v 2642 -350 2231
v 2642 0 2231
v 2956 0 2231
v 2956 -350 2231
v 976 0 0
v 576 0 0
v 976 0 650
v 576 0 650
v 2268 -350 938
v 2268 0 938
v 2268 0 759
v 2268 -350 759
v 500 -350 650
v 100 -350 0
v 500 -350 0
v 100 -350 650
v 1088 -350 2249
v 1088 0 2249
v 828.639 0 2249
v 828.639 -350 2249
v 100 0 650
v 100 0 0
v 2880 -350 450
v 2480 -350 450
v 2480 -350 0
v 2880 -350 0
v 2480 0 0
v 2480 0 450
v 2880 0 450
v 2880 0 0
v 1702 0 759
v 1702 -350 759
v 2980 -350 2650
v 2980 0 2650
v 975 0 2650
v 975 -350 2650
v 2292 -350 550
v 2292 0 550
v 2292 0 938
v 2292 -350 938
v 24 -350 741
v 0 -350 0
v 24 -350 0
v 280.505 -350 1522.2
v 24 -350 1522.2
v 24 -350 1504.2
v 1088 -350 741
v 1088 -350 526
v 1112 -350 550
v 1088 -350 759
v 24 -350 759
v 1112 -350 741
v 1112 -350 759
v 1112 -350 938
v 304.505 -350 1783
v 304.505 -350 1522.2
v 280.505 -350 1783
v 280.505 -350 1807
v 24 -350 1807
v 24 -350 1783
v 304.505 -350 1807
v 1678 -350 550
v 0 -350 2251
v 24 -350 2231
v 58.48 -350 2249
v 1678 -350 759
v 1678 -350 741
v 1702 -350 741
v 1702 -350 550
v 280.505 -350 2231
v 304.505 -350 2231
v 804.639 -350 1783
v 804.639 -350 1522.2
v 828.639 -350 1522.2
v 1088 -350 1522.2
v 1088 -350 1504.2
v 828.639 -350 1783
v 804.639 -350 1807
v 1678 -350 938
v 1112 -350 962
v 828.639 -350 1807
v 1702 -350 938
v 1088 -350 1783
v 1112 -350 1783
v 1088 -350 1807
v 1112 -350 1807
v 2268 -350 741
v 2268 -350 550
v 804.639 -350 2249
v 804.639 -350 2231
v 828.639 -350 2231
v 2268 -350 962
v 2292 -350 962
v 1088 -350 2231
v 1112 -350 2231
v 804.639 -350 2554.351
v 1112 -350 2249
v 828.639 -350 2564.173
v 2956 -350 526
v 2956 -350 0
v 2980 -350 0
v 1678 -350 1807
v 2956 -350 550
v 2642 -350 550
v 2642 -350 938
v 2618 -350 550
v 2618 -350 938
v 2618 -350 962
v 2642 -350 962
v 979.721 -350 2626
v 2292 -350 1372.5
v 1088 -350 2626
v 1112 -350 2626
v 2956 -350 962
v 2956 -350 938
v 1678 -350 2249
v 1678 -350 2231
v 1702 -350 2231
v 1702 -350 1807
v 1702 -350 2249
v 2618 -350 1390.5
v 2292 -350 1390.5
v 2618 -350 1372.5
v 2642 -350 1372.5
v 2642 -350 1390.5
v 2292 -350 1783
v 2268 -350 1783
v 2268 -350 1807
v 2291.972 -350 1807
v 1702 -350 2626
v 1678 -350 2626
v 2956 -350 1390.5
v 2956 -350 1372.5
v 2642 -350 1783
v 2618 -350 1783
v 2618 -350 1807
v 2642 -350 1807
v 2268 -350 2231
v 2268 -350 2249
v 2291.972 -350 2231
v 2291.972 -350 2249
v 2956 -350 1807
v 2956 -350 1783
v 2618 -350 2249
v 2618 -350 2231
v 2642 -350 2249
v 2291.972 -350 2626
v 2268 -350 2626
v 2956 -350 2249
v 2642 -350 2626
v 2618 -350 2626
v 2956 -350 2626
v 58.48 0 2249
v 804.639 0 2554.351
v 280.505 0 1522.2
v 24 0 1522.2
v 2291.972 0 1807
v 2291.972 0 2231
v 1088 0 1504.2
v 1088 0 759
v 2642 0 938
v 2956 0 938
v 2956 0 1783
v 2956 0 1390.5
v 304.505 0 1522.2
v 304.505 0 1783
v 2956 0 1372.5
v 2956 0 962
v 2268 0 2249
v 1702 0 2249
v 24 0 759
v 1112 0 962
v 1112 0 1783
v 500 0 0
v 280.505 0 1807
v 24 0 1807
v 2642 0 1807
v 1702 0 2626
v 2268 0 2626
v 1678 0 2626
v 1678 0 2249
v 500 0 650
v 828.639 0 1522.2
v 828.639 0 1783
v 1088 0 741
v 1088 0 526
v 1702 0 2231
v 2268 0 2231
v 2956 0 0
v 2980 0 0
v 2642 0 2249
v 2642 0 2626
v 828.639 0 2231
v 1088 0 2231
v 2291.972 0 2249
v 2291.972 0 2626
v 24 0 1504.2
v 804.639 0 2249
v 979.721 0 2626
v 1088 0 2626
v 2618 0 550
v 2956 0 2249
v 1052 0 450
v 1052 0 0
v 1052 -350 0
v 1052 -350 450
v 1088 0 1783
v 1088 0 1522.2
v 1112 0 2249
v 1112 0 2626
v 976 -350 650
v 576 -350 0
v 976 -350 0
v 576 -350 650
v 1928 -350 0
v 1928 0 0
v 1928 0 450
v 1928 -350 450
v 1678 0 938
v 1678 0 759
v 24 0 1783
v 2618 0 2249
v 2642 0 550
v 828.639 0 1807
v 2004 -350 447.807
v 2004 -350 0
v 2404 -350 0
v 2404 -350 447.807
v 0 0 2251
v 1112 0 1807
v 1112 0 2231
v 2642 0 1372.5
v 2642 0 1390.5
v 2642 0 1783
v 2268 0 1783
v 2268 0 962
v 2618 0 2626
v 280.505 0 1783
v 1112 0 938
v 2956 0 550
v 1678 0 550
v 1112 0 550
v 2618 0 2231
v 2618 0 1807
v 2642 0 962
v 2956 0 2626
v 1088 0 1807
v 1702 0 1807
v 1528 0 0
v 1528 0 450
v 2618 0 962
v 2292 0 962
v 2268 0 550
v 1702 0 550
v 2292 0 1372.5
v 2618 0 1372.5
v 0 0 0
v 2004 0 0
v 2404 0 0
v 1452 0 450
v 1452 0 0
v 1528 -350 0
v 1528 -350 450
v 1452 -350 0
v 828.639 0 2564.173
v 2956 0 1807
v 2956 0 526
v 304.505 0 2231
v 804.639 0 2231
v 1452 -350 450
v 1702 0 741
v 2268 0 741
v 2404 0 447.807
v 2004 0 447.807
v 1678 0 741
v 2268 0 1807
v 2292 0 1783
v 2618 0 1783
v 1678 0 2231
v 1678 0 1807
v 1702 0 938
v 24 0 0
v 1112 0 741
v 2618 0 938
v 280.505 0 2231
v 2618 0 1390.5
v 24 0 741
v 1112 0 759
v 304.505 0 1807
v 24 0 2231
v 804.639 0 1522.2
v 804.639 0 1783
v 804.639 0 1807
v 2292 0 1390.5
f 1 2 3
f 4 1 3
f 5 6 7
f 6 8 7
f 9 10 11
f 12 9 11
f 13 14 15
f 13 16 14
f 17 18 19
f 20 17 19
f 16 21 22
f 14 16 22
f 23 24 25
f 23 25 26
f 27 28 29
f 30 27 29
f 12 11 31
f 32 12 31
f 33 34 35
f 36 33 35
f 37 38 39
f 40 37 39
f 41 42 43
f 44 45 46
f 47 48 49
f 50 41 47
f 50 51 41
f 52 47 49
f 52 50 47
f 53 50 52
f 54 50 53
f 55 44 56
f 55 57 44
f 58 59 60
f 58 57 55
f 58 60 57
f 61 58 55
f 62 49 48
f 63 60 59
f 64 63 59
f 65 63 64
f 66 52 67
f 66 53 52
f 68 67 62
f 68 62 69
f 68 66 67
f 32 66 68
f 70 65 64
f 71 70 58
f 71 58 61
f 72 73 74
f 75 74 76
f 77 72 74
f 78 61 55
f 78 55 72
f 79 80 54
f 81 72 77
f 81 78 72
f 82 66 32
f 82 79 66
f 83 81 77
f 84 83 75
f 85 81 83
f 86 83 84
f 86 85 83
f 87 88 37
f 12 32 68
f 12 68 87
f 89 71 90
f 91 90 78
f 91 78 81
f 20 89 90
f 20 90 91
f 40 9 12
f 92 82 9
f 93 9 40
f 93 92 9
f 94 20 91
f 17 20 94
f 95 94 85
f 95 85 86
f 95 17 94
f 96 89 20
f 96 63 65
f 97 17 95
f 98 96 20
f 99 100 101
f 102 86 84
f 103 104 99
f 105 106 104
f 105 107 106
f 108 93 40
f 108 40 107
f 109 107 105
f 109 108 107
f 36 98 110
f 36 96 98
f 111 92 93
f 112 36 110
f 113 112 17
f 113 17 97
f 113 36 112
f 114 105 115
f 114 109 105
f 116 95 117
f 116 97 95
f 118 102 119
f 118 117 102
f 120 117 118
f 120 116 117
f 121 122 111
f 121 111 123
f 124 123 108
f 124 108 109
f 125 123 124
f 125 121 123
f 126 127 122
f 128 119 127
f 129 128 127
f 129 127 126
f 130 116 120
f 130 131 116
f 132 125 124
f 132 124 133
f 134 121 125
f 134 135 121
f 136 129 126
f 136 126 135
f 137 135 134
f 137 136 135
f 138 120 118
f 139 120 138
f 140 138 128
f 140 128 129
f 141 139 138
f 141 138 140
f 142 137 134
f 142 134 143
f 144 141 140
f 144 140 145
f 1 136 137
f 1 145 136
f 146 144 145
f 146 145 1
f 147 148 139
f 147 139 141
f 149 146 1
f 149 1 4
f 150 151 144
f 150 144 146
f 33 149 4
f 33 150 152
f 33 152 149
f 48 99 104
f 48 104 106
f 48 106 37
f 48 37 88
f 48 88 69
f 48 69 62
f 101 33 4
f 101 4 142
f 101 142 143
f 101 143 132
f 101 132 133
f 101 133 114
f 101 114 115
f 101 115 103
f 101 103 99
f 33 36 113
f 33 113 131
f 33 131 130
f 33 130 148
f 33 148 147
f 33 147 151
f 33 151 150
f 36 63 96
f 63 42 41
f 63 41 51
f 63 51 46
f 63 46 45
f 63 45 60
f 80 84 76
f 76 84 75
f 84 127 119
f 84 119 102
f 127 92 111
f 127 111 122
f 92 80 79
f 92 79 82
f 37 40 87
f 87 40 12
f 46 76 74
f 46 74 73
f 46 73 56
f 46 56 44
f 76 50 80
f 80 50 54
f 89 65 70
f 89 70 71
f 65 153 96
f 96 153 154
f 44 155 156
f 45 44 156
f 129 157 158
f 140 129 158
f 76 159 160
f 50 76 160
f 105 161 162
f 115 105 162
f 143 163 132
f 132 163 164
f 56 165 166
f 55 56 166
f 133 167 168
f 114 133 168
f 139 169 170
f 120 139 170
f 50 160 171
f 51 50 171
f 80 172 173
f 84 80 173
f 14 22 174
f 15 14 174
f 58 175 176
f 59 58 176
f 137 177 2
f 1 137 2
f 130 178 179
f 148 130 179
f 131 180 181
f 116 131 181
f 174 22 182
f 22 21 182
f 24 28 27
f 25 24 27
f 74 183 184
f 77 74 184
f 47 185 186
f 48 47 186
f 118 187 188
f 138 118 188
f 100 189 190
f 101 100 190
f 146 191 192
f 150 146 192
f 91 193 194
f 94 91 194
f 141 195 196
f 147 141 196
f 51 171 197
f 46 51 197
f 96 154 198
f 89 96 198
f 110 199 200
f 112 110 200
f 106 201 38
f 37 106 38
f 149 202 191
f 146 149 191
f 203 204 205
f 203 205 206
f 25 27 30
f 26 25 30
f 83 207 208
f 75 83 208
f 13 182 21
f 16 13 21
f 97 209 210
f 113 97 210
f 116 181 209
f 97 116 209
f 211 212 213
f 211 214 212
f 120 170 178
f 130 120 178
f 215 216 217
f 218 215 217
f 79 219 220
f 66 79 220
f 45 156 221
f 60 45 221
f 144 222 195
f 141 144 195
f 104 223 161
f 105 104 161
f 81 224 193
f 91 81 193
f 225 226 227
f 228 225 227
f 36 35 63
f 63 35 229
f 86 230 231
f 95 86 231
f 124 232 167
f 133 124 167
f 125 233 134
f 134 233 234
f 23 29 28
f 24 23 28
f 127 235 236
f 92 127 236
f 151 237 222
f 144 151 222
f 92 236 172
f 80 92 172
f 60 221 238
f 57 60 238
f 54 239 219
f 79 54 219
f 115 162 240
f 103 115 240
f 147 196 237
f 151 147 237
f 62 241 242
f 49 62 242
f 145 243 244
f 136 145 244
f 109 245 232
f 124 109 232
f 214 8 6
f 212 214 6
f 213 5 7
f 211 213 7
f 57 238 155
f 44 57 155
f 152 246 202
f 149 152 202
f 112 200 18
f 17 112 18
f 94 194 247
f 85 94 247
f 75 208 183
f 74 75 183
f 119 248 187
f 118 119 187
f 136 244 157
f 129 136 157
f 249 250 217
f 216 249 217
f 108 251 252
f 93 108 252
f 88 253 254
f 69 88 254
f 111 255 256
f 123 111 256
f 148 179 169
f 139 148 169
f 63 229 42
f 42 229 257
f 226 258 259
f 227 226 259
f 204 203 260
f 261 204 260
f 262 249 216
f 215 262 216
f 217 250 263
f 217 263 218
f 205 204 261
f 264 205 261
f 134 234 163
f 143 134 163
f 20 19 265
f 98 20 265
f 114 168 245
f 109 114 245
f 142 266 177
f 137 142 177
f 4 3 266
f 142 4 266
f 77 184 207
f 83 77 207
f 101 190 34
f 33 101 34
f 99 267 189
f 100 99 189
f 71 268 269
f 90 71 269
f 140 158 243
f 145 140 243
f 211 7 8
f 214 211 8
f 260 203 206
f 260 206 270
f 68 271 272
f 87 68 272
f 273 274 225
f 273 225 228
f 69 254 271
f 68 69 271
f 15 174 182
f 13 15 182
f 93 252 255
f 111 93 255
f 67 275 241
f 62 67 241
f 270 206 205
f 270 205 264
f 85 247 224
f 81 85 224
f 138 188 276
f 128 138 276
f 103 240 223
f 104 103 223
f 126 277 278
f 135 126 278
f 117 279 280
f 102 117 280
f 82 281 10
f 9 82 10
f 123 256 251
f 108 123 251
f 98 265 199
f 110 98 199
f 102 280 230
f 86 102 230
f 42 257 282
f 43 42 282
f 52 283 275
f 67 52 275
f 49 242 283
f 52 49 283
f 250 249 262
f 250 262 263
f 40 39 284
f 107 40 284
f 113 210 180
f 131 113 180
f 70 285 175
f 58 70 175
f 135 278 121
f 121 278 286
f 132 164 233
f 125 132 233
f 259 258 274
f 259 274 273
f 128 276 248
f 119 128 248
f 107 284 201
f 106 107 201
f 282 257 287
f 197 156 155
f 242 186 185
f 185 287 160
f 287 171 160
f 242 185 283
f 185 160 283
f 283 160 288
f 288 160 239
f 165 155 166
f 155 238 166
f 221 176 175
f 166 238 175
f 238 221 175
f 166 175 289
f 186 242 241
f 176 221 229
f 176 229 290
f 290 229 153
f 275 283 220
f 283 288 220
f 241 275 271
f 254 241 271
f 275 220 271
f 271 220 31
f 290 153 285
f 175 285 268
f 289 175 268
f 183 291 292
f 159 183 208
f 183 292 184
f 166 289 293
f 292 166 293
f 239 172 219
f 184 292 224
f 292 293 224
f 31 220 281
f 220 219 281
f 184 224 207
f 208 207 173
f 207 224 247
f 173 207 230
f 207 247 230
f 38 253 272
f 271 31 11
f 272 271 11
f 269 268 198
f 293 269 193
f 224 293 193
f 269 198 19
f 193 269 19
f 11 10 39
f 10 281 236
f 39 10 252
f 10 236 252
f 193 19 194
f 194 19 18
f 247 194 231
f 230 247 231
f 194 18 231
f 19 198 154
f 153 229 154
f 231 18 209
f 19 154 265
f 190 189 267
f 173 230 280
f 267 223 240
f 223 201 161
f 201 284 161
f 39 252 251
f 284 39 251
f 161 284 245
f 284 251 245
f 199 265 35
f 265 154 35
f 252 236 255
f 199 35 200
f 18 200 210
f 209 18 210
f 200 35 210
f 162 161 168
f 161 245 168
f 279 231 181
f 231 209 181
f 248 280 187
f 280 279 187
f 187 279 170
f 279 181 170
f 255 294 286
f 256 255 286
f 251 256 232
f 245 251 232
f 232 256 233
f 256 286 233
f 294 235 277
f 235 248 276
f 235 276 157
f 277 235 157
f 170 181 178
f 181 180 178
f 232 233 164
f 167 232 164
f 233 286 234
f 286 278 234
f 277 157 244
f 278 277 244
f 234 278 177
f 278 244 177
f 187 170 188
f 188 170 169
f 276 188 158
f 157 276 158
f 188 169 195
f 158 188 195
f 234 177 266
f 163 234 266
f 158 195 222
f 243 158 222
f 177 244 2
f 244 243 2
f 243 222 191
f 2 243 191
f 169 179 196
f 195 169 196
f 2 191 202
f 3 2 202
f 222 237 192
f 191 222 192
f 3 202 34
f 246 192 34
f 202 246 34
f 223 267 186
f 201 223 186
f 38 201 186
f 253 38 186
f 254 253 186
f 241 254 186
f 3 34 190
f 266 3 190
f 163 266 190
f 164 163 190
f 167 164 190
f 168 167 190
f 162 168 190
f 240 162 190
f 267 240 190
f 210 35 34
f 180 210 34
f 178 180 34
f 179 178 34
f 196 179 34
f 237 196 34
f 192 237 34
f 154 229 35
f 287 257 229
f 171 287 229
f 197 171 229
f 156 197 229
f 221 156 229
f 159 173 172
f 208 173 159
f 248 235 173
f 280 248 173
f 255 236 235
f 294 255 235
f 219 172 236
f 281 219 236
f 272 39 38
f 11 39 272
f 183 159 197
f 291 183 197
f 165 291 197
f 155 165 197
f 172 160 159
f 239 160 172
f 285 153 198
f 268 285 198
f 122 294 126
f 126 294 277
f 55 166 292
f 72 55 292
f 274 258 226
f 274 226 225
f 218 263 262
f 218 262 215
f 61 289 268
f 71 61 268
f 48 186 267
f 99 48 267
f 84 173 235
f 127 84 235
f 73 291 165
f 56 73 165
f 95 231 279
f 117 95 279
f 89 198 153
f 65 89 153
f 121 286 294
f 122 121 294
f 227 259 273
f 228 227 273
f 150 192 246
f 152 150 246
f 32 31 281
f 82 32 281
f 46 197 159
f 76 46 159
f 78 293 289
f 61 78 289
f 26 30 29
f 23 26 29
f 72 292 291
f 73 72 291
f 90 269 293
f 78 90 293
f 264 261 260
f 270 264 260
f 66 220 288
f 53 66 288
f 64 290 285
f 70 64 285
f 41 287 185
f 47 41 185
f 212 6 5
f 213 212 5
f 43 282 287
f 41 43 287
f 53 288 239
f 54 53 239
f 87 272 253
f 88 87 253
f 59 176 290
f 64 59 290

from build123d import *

# Parameters (mm, degrees)
F1_DEPTH = 350
F0_W     = 400
F0_H     = 450
F0_H_2   = 447.8067984339


# Not quite as in the source:
# - a feature names something its author has since deleted; it is built from what else it names


with BuildPart() as f1:
    # F0 (on Front) → F1 (new body)
    with BuildSketch(Plane.XZ):
        Polygon((0, 2249), (0, 0), (24, 0), (24, 502), (24, 741), (17, 741), (17, 759), (24, 759), (24, 1504.2), (17, 1504.2), (17, 1522.2), (24, 1522.2), (24, 1783), (17, 1783), (17, 1807), (24, 1807), (24, 2231), (17, 2231), (17, 2249), align=None)
        Polygon((0, 2251), (0, 2249), (17, 2249), (58.4801681387, 2249), (804.639455329, 2554.3513390656), (804.639455329, 2565.1562908123), (828.639455329, 2574.9778292739), (828.639455329, 2564.1728775272), (979.7207696423, 2626), (1088, 2626), (1088, 2636), (1112, 2636), (1112, 2626), (1678, 2626), (1678, 2636), (1702, 2636), (1702, 2626), (2268, 2626), (2268, 2636), (2291.9720954895, 2636), (2291.9720954895, 2626), (2618, 2626), (2618, 2636), (2642, 2636), (2642, 2626), (2956, 2626), (2980, 2650), (975, 2650), align=None)
        Polygon((58.4801681387, 2249), (17, 2249), (17, 2231), (24, 2231), (280.5054049087, 2231), (280.5054049087, 2236.0000610352), (304.5054049087, 2236.0000610352), (304.5054049087, 2231), (804.639455329, 2231), (811.639455329, 2231), (811.639455329, 2249), (804.639455329, 2249), (298.6695170403, 2249), align=None)
        Polygon((17, 741), (24, 741), (1088, 741), (1095, 741), (1095, 759), (1088, 759), (24, 759), (17, 759), align=None)
        Polygon((2980, 0), (2980, 2650), (2956, 2626), (2956, 2249), (2963, 2249), (2963, 2231), (2956, 2231), (2956, 1807), (2963, 1807), (2963, 1783), (2956, 1783), (2956, 1390.5), (2963, 1390.5), (2963, 1372.5), (2956, 1372.5), (2956, 962), (2963, 962), (2963, 938), (2956, 938), (2956, 550), (2963, 550), (2963, 526), (2956, 526), (2956, 502), (2956, 0), align=None)
        Polygon((804.639455329, 2565.1562908123), (804.639455329, 2554.3513390656), (804.639455329, 2249), (811.639455329, 2249), (811.639455329, 2231), (804.639455329, 2231), (804.639455329, 1807), (811.639455329, 1807), (811.639455329, 1783), (804.639455329, 1783), (804.639455329, 1522.2), (804.639455329, 1515.2), (828.639455329, 1515.2), (828.639455329, 1522.2), (828.639455329, 1783), (822.0379948616, 1783), (822.0379948616, 1807), (828.639455329, 1807), (828.639455329, 2231), (822.0379948616, 2231), (822.0379948616, 2249), (828.639455329, 2249), (828.639455329, 2564.1728775272), (828.639455329, 2574.9778292739), align=None)
        Polygon((1095, 741), (1088, 741), (1088, 526), (1112, 550), (1112, 741), (1105, 741), (1105, 759), (1112, 759), (1112, 938), (1105, 938), (1105, 962), (1112, 962), (1112, 1222.6), (1112, 1783), (1105, 1783), (1105, 1807), (1112, 1807), (1112, 2231), (1105, 2231), (1105, 2249), (1112, 2249), (1112, 2626), (1112, 2636), (1088, 2636), (1088, 2626), (1088, 2249), (1095, 2249), (1095, 2231), (1088, 2231), (1088, 1807), (1095, 1807), (1095, 1783), (1088, 1783), (1088, 1522.2), (1095, 1522.2), (1095, 1504.2), (1088, 1504.2), (1088, 1222.6), (1088, 938), (1088, 759), (1095, 759), align=None)
        Polygon((280.5054049087, 2236.0000610352), (280.5054049087, 2231), (280.5054049087, 1807), (287.3089313507, 1807), (287.3089313507, 1783), (280.5054049087, 1783), (280.5054049087, 1522.2), (280.5054049087, 1515.2), (304.5054049087, 1515.2), (304.5054049087, 1522.2), (304.5054049087, 1783), (298.6695170403, 1783), (298.6695170403, 1807), (304.5054049087, 1807), (304.5054049087, 2231), (304.5054049087, 2236.0000610352), align=None)
        Polygon((280.5054049087, 1807), (24, 1807), (17, 1807), (17, 1783), (24, 1783), (280.5054049087, 1783), (287.3089313507, 1783), (287.3089313507, 1807), align=None)
        Polygon((1112, 550), (1088, 526), (2956, 526), (2963, 526), (2963, 550), (2956, 550), (2642, 550), (2642, 540), (2618, 540), (2618, 550), (2292, 550), (2292, 540), (2268, 540), (2268, 550), (1702, 550), (1702, 540), (1678, 540), (1678, 550), align=None)
        Polygon((2642, 2249), (2642, 2626), (2642, 2636), (2618, 2636), (2618, 2626), (2618, 2249), (2625, 2249), (2625, 2231), (2618, 2231), (2618, 1807), (2625, 1807), (2625, 1783), (2618, 1783), (2618, 1390.5), (2625, 1390.5), (2625, 1372.5), (2618, 1372.5), (2618, 962), (2625, 962), (2625, 938), (2618, 938), (2618, 550), (2618, 540), (2642, 540), (2642, 550), (2642, 938), (2635, 938), (2635, 962), (2642, 962), (2642, 1372.5), (2635, 1372.5), (2635, 1390.5), (2642, 1390.5), (2642, 1783), (2635, 1783), (2635, 1807), (2642, 1807), (2642, 2231), (2635, 2231), (2635, 2249), align=None)
        Polygon((2963, 2249), (2956, 2249), (2642, 2249), (2635, 2249), (2635, 2231), (2642, 2231), (2956, 2231), (2963, 2231), align=None)
        Polygon((1678, 741), (1678, 550), (1678, 540), (1702, 540), (1702, 550), (1702, 741), (1695, 741), (1695, 759), (1702, 759), (1702, 938), (1702, 945), (1678, 945), (1678, 938), (1678, 759), (1685, 759), (1685, 741), align=None)
        Polygon((1105, 741), (1112, 741), (1678, 741), (1685, 741), (1685, 759), (1678, 759), (1112, 759), (1105, 759), align=None)
        Polygon((17, 1504.2), (24, 1504.2), (1088, 1504.2), (1095, 1504.2), (1095, 1522.2), (1088, 1522.2), (828.639455329, 1522.2), (828.639455329, 1515.2), (804.639455329, 1515.2), (804.639455329, 1522.2), (304.5054049087, 1522.2), (304.5054049087, 1515.2), (280.5054049087, 1515.2), (280.5054049087, 1522.2), (24, 1522.2), (17, 1522.2), align=None)
        Polygon((1088, 2249), (828.639455329, 2249), (822.0379948616, 2249), (822.0379948616, 2231), (828.639455329, 2231), (1088, 2231), (1095, 2231), (1095, 2249), align=None)
        Polygon((811.639455329, 1807), (804.639455329, 1807), (304.5054049087, 1807), (298.6695170403, 1807), (298.6695170403, 1783), (304.5054049087, 1783), (804.639455329, 1783), (811.639455329, 1783), align=None)
        Polygon((2291.9720954895, 2249), (2291.9720954895, 2626), (2291.9720954895, 2636), (2268, 2636), (2268, 2626), (2268, 2249), (2275, 2249), (2275, 2231), (2268, 2231), (2268, 1807), (2275, 1807), (2275, 1783), (2268, 1783), (2268, 962), (2275, 962), (2275, 938), (2268, 938), (2268, 759), (2275, 759), (2275, 741), (2268, 741), (2268, 550), (2268, 540), (2292, 540), (2292, 550), (2292, 938), (2284.9720954895, 938), (2284.9720954895, 962), (2292, 962), (2292, 1372.5), (2284.9720954895, 1372.5), (2284.9720954895, 1390.5), (2292, 1390.5), (2292, 1783), (2284.9720954895, 1783), (2284.9720954895, 1807), (2291.9720954895, 1807), (2291.9720954895, 2231), (2284.9720954895, 2231), (2284.9720954895, 2249), align=None)
        Polygon((2625, 2249), (2618, 2249), (2291.9720954895, 2249), (2284.9720954895, 2249), (2284.9720954895, 2231), (2291.9720954895, 2231), (2618, 2231), (2625, 2231), align=None)
        Polygon((2963, 1807), (2956, 1807), (2642, 1807), (2635, 1807), (2635, 1783), (2642, 1783), (2818.1127872467, 1783), (2956, 1783), (2963, 1783), align=None)
        Polygon((2642, 938), (2956, 938), (2963, 938), (2963, 962), (2956, 962), (2818.1127872467, 962), (2642, 962), (2635, 962), (2635, 938), align=None)
        Polygon((1695, 741), (1702, 741), (2268, 741), (2275, 741), (2275, 759), (2268, 759), (1702, 759), (1695, 759), align=None)
        Polygon((1105, 938), (1112, 938), (1678, 938), (1678, 945), (1702, 945), (1702, 938), (2268, 938), (2275, 938), (2275, 962), (2268, 962), (1112, 962), (1105, 962), align=None)
        Polygon((1088, 1807), (828.639455329, 1807), (822.0379948616, 1807), (822.0379948616, 1783), (828.639455329, 1783), (1088, 1783), (1095, 1783), (1095, 1807), align=None)
        Polygon((1678, 2636), (1678, 2626), (1678, 2249), (1685, 2249), (1685, 2231), (1678, 2231), (1678, 1807), (1678, 1800), (1702, 1800), (1702, 1807), (1702, 2231), (1695, 2231), (1695, 2249), (1702, 2249), (1702, 2626), (1702, 2636), align=None)
        Polygon((1678, 2249), (1112, 2249), (1105, 2249), (1105, 2231), (1112, 2231), (1678, 2231), (1685, 2231), (1685, 2249), align=None)
        Polygon((2275, 2249), (2268, 2249), (1702, 2249), (1695, 2249), (1695, 2231), (1702, 2231), (2268, 2231), (2275, 2231), align=None)
        Polygon((2625, 1807), (2618, 1807), (2291.9720954895, 1807), (2284.9720954895, 1807), (2284.9720954895, 1783), (2292, 1783), (2618, 1783), (2625, 1783), align=None)
        Polygon((2963, 1390.5), (2956, 1390.5), (2642, 1390.5), (2635, 1390.5), (2635, 1372.5), (2642, 1372.5), (2956, 1372.5), (2963, 1372.5), align=None)
        Polygon((2292, 938), (2618, 938), (2625, 938), (2625, 962), (2618, 962), (2292, 962), (2284.9720954895, 962), (2284.9720954895, 938), align=None)
        Polygon((1112, 1783), (2268, 1783), (2275, 1783), (2275, 1807), (2268, 1807), (1702, 1807), (1702, 1800), (1678, 1800), (1678, 1807), (1112, 1807), (1105, 1807), (1105, 1783), align=None)
        Polygon((2625, 1390.5), (2618, 1390.5), (2292, 1390.5), (2284.9720954895, 1390.5), (2284.9720954895, 1372.5), (2292, 1372.5), (2618, 1372.5), (2625, 1372.5), align=None)
    extrude(amount=F1_DEPTH)


with BuildPart() as f1b:
    # F0 (on Front) → F1, piece 2 (new body)
    with BuildSketch(Plane.XZ):
        Polygon((100, 450), (100, 0), (500, 0), (500, 450), (500, 650), (100, 650), align=None)
    extrude(amount=F1_DEPTH)


with BuildPart() as f1c:
    # F0 (on Front) → F1, piece 3 (new body)
    with BuildSketch(Plane.XZ):
        Polygon((576, 450), (576, 0), (976, 0), (976, 450), (976, 650), (576, 650), align=None)
    extrude(amount=F1_DEPTH)


with BuildPart() as f1d:
    # F0 (on Front) → F1, piece 4 (new body)
    with BuildSketch(Plane.XZ):
        with Locations((1252, 225)):
            Rectangle(F0_W, F0_H)
    extrude(amount=F1_DEPTH)


with BuildPart() as f1e:
    # F0 (on Front) → F1, piece 5 (new body)
    with BuildSketch(Plane.XZ):
        Polygon((2850, 0), (2880, 0), (2880, 450), (2480, 450), (2480, 0), align=None)
    extrude(amount=F1_DEPTH)


with BuildPart() as f1f:
    # F0 (on Front) → F1, piece 6 (new body)
    with BuildSketch(Plane.XZ):
        with Locations((1728, 225)):
            Rectangle(F0_W, F0_H)
    extrude(amount=F1_DEPTH)


with BuildPart() as f1g:
    # F0 (on Front) → F1, piece 7 (new body)
    with BuildSketch(Plane.XZ):
        with Locations((2204, 223.9033992169)):
            Rectangle(F0_W, F0_H_2)
    extrude(amount=F1_DEPTH)


solid = Compound([f1.part, f1b.part, f1c.part, f1d.part, f1e.part, f1f.part, f1g.part])
